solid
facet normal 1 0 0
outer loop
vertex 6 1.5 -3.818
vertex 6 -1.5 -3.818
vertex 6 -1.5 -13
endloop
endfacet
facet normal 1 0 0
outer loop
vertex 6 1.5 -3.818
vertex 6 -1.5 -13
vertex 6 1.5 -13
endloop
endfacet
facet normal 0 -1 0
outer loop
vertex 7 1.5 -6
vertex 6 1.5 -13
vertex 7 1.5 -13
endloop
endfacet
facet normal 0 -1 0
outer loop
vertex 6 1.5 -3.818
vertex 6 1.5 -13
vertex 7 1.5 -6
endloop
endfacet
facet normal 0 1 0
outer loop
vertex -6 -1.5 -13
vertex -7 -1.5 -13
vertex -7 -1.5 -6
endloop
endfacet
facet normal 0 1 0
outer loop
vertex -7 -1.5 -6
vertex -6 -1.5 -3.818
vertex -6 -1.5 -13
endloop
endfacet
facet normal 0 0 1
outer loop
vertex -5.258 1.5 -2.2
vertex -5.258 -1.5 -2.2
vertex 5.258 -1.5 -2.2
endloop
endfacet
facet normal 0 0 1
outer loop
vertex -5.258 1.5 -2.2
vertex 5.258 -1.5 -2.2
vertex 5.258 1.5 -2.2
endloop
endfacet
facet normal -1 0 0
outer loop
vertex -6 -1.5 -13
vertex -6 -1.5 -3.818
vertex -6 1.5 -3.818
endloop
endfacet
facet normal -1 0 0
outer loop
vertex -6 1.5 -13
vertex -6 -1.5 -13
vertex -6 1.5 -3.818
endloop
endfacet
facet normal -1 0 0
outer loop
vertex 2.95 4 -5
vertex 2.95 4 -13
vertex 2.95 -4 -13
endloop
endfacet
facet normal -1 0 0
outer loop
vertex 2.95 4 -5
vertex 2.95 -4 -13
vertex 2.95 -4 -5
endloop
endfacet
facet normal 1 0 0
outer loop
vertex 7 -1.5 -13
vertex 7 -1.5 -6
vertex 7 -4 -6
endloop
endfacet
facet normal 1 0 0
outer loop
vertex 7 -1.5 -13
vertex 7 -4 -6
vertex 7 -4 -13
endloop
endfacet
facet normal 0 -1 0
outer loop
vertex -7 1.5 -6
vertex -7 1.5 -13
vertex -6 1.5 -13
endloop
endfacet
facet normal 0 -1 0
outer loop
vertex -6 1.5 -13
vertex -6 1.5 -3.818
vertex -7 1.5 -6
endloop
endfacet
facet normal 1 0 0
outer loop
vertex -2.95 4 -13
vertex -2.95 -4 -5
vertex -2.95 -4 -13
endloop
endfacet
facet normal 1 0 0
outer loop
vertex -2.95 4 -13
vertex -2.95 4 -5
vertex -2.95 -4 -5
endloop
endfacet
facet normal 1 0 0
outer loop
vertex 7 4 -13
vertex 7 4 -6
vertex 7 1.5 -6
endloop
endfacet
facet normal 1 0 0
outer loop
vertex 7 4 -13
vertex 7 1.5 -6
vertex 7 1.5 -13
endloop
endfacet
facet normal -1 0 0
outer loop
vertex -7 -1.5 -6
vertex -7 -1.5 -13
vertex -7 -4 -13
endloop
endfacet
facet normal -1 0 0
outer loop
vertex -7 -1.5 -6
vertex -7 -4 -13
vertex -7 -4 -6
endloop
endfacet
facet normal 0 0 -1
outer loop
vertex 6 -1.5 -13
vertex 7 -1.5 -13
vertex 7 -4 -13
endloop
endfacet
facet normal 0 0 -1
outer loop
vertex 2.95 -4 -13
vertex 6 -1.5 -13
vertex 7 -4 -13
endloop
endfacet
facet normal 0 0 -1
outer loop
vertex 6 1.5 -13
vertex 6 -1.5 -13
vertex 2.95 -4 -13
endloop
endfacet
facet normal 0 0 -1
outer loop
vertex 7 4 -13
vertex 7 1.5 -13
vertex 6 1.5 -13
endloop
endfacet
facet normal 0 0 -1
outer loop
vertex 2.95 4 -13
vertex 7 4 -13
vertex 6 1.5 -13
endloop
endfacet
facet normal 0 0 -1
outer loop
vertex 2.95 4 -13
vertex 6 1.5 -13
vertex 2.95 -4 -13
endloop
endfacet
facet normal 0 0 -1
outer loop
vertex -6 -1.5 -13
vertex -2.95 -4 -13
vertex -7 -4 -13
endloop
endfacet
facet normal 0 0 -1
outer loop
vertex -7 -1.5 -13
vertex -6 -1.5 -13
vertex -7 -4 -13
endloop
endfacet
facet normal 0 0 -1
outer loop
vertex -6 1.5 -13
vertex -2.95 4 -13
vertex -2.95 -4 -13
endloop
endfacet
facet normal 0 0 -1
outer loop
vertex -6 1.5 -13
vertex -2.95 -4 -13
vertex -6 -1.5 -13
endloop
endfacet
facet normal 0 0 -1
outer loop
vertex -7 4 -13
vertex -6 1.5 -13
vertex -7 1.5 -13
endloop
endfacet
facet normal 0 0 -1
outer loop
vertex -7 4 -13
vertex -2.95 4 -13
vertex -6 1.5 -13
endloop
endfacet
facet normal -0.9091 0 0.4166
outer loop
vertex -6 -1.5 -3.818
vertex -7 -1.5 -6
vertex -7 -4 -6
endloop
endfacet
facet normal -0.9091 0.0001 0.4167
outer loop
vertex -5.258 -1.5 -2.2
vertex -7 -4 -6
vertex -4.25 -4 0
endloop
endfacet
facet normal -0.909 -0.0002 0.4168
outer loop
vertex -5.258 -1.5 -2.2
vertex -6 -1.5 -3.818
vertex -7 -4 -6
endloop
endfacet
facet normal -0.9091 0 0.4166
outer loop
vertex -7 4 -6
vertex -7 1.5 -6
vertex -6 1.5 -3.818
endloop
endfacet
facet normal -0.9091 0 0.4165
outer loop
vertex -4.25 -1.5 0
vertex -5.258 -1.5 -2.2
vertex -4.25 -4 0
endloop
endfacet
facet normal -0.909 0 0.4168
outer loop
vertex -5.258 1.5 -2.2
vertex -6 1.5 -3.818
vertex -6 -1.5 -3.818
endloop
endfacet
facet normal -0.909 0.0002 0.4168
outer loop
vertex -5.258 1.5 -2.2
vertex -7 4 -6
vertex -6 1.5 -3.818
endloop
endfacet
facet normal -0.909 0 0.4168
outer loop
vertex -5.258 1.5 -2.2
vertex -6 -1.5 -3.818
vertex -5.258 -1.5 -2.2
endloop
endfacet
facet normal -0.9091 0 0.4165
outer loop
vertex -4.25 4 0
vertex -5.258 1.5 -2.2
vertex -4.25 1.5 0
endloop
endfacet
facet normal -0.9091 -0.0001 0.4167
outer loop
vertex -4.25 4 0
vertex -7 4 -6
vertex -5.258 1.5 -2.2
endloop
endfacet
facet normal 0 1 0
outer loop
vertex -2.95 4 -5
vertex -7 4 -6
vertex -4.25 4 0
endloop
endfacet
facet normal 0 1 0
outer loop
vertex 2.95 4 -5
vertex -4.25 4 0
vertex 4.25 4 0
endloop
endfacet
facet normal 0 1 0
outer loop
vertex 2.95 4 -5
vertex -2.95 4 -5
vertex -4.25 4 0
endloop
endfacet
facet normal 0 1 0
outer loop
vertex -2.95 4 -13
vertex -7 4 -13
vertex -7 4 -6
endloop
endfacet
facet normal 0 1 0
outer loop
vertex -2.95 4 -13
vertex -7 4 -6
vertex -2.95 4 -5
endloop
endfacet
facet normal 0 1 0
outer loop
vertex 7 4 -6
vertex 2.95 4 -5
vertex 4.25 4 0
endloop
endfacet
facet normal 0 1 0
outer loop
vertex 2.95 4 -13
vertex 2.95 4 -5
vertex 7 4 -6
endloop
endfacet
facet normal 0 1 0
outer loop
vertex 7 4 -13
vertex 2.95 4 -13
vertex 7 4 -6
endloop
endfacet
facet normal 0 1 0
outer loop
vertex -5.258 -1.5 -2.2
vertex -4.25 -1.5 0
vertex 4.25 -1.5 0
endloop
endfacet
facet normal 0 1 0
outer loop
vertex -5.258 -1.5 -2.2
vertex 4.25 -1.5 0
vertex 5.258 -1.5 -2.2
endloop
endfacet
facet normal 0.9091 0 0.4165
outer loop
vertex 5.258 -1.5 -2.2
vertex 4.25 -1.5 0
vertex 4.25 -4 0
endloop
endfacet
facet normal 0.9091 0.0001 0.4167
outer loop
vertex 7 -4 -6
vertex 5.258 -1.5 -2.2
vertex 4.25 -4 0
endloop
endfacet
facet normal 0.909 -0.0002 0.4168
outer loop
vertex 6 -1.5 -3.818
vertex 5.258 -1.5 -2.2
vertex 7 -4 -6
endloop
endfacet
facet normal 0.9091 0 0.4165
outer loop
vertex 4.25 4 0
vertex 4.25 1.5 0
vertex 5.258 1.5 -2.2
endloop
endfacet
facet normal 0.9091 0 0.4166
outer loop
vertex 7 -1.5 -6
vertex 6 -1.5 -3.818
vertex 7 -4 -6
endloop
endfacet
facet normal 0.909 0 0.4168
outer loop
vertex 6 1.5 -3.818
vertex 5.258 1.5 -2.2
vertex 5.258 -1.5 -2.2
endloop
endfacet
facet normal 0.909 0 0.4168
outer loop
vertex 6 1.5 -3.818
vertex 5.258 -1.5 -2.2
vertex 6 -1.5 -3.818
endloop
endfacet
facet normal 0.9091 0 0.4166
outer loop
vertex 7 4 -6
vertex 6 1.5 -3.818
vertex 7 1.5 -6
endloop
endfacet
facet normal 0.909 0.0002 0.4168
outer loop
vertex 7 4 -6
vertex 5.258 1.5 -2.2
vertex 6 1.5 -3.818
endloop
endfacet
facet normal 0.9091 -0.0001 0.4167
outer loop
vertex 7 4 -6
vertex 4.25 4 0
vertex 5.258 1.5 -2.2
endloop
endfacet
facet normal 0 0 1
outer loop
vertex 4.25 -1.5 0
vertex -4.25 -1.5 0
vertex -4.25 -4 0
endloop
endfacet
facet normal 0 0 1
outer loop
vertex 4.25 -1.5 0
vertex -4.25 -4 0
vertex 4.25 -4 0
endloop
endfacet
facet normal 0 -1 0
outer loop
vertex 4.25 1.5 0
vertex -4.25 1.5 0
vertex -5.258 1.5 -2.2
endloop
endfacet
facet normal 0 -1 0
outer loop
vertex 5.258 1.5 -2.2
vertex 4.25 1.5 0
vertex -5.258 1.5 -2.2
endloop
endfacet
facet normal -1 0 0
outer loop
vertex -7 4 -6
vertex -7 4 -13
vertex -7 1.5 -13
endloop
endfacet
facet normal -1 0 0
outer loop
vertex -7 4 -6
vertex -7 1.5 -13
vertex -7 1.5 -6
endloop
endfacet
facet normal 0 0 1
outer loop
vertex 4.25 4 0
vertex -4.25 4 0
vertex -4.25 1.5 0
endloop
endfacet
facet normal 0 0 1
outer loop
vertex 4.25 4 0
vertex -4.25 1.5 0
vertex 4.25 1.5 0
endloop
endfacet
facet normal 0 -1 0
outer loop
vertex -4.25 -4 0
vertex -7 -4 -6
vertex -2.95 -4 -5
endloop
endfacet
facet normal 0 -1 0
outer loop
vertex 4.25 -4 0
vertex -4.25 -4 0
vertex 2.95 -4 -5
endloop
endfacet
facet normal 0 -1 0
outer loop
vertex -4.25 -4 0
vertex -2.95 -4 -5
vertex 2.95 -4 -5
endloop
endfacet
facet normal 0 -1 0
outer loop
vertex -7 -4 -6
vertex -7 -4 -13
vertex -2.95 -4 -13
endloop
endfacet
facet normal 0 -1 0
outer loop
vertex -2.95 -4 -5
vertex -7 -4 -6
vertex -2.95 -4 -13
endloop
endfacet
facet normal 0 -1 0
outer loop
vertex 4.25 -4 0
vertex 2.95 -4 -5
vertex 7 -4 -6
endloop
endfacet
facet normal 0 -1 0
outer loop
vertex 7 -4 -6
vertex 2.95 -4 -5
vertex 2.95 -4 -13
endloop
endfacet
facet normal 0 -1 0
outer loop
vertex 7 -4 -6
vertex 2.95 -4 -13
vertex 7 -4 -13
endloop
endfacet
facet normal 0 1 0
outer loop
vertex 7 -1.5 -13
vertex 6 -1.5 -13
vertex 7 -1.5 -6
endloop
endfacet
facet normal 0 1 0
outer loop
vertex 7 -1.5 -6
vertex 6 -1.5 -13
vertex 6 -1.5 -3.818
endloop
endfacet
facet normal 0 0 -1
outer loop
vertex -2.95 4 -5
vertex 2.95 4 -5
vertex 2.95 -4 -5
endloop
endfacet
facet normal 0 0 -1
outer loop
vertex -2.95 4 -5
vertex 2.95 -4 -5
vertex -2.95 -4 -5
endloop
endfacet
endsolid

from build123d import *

# Parameters (mm, degrees)
BOSS_EXTRUDE1_DEPTH     = 4
CUT_EXTRUDE1_DEPTH      = 16.297058541
CUT_EXTRUDE1_DEPTH_BACK = 16.297058541
SKETCH2_W               = 2.2
SKETCH2_H               = 3
SKETCH3_W               = 1
SKETCH3_H               = 3
CUT_EXTRUDE2_DEPTH      = 16.297058541


with BuildPart() as part:
    # Sketch1 → Boss-Extrude1 (new, symmetric)
    with BuildSketch(Plane(origin=(0, 0, 0), x_dir=(1, 0, 0), z_dir=(0, 1, 0))):
        Polygon((-7, 13), (-7, 6), (-4.25, 0), (4.25, 0), (7, 6), (7, 13), (2.95, 13), (2.95, 5), (-2.95, 5), (-2.95, 13), align=None)
    extrude(amount=BOSS_EXTRUDE1_DEPTH, both=True)

    # Sketch2 → Cut-Extrude1 (cut, two sides: drawn at the far end of the back side and taken through both)
    with BuildSketch(Plane(origin=(0, 0, 0), x_dir=(0, 0, -1), z_dir=(1, 0, 0)).offset(-CUT_EXTRUDE1_DEPTH_BACK)):
        with Locations((1.1, 0)):
            Rectangle(SKETCH2_W, SKETCH2_H)
    extrude(amount=CUT_EXTRUDE1_DEPTH + CUT_EXTRUDE1_DEPTH_BACK, mode=Mode.SUBTRACT)

    # Sketch3 → Cut-Extrude2 (cut, through all)
    with BuildSketch(Plane.XY):
        with Locations((-6.5, 0)):
            Rectangle(SKETCH3_W, SKETCH3_H)
        with Locations((6.5, 0)):
            Rectangle(SKETCH3_W, SKETCH3_H)
    extrude(amount=-CUT_EXTRUDE2_DEPTH, mode=Mode.SUBTRACT)


solid = part.part
